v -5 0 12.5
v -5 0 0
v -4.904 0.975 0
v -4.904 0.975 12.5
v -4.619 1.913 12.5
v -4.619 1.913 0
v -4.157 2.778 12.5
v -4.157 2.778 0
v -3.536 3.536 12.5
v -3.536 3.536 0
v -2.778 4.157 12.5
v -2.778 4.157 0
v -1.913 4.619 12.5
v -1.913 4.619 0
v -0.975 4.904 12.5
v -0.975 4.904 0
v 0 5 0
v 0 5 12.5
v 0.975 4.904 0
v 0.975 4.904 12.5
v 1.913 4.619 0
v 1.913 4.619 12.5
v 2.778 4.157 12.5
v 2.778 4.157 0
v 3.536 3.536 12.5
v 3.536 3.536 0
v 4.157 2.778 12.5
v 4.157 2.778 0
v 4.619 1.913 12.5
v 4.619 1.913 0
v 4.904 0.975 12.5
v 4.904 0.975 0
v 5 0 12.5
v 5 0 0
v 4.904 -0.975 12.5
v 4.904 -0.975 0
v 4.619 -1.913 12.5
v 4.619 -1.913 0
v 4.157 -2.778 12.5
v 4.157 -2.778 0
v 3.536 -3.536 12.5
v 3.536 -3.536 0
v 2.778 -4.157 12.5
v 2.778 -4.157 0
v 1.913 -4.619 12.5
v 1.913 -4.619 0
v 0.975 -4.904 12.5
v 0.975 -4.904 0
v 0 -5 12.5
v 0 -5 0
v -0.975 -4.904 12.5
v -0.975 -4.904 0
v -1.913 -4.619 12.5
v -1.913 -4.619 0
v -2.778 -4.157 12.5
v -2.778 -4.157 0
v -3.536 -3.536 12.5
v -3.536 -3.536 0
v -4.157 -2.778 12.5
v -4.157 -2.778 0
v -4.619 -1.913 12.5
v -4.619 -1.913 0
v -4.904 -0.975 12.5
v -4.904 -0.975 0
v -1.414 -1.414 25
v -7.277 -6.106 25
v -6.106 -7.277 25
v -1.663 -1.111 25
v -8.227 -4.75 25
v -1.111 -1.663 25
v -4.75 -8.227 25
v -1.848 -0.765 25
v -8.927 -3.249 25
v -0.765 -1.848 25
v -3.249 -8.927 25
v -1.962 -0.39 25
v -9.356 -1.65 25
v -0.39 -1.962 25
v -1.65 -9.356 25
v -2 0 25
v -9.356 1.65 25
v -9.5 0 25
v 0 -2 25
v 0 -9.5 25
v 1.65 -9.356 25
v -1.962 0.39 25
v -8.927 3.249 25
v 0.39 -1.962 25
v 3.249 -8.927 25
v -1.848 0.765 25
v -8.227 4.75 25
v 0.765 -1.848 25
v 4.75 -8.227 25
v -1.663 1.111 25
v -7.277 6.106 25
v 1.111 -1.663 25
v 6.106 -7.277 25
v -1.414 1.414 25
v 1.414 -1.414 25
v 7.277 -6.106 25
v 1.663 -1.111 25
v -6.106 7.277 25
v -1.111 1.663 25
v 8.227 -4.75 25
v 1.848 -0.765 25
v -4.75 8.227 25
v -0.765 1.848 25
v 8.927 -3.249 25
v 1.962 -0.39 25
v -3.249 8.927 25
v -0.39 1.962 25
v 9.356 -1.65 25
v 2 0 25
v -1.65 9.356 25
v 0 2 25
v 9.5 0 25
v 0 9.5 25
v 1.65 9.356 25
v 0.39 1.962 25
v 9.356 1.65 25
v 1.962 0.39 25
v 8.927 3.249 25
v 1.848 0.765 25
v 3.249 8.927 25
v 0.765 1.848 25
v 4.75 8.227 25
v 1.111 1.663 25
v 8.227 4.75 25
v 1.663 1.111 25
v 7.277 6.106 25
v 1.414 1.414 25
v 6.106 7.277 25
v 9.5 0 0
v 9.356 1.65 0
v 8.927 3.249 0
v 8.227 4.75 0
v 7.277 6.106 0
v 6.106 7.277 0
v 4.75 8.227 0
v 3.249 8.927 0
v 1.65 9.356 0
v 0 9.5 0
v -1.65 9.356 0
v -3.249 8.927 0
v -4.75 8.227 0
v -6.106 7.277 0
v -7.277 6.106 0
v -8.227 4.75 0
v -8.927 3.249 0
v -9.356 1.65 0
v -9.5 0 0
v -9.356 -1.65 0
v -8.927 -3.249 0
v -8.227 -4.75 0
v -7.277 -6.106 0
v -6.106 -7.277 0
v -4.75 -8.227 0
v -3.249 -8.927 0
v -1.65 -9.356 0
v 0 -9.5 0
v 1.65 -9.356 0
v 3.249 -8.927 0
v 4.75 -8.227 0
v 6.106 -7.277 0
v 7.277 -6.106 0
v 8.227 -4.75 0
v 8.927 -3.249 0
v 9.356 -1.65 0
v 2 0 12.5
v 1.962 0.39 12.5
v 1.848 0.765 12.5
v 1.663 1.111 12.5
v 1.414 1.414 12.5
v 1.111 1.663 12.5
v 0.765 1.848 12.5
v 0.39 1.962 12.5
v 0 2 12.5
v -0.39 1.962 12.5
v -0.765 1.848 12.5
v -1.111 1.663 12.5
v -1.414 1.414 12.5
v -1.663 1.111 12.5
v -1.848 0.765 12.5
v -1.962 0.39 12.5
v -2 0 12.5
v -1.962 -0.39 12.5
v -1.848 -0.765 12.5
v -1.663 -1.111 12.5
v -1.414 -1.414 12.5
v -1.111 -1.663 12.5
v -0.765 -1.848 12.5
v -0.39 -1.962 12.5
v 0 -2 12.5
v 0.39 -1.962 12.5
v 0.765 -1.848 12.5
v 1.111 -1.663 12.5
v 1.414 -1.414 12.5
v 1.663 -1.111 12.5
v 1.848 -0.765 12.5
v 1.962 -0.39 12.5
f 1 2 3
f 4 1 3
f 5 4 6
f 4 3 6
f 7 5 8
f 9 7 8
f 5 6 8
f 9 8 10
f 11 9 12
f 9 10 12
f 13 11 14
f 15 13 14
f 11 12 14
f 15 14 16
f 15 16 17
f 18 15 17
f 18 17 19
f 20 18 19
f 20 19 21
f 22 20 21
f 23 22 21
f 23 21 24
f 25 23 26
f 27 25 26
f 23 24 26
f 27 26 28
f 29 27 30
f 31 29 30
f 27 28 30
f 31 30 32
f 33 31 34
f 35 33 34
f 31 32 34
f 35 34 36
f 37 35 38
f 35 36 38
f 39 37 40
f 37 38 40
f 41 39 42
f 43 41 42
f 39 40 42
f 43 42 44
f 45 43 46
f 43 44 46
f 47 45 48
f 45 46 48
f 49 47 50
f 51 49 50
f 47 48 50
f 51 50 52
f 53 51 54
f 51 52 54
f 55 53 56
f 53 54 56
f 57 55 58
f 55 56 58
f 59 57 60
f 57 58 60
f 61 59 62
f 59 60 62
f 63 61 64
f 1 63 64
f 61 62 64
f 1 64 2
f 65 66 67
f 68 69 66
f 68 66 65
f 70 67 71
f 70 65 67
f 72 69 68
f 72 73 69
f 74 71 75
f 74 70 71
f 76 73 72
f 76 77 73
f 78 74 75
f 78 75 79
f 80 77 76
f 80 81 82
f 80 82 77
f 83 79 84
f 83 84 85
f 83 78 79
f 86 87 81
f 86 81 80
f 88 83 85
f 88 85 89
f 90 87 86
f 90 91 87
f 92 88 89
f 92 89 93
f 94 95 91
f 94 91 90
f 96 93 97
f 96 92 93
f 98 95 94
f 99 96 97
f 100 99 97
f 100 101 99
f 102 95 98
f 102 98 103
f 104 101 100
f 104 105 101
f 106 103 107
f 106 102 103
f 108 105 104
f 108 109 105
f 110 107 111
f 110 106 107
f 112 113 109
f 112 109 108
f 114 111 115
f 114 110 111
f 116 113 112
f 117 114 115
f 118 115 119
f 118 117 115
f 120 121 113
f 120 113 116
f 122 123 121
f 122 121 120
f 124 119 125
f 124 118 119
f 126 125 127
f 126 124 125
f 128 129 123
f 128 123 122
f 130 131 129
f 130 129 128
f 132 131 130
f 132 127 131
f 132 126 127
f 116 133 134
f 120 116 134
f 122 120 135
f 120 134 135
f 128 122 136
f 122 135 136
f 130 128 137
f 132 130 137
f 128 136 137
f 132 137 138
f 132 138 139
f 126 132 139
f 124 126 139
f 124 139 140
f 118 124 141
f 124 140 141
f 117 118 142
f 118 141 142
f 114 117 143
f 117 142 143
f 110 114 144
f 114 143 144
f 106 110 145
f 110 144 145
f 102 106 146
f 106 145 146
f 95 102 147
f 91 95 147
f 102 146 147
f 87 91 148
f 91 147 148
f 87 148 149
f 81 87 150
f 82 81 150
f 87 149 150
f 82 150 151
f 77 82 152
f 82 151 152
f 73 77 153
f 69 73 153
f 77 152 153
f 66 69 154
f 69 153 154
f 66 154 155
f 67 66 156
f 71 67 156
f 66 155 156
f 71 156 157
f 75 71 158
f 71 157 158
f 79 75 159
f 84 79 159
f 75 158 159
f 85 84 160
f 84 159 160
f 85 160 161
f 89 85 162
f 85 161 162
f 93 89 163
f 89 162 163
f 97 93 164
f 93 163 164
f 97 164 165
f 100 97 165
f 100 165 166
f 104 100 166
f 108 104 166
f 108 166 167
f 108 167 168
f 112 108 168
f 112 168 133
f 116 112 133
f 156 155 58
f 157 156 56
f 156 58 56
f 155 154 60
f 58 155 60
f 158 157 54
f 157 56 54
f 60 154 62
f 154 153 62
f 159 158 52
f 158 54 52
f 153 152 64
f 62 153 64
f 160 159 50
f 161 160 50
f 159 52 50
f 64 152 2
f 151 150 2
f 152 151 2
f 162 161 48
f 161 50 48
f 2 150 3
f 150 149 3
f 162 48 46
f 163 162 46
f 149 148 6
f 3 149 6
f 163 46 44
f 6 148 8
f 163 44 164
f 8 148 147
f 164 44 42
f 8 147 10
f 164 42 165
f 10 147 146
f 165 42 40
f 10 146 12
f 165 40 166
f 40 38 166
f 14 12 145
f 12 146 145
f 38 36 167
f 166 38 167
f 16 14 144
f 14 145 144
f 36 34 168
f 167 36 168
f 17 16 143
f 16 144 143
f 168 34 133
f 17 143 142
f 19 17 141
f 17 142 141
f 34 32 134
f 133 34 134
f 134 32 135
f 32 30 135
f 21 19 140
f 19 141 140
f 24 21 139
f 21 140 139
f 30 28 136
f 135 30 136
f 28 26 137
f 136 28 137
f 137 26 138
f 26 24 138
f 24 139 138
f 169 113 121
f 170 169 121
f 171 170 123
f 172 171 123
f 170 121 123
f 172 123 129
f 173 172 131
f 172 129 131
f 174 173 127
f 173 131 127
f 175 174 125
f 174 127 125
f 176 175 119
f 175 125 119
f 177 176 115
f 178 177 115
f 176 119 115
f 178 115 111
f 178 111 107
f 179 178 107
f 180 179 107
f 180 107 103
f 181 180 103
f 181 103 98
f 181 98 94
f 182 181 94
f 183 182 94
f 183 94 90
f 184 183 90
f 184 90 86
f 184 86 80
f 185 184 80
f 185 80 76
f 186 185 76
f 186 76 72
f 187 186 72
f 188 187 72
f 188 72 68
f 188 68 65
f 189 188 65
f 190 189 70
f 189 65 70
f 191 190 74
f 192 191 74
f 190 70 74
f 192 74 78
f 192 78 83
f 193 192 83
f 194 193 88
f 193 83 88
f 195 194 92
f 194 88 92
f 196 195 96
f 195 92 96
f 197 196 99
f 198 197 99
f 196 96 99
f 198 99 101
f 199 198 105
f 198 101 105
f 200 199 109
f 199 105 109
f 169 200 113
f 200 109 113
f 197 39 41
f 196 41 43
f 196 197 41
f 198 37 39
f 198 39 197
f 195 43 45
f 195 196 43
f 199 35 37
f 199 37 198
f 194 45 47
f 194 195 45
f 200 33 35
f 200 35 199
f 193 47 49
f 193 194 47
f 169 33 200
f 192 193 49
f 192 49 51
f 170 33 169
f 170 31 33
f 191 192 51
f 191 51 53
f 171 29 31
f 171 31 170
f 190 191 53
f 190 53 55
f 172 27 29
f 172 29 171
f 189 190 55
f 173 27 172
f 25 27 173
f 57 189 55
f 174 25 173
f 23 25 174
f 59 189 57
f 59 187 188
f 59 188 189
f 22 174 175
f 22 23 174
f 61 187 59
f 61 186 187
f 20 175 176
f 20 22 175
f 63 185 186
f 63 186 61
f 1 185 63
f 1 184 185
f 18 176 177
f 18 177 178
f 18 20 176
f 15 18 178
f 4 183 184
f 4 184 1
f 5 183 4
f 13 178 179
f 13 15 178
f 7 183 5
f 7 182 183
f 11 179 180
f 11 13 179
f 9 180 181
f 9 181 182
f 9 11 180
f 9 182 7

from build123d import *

# Parameters (mm, degrees)
SKETCH1_R           = 9.5
BOSS_EXTRUDE1_DEPTH = 25
SKETCH2_R           = 2
CUT_EXTRUDE1_DEPTH  = 26
SKETCH3_R           = 5
CUT_EXTRUDE2_DEPTH  = 12.5


with BuildPart() as part:
    # Sketch1 → Boss-Extrude1 (new body)
    with BuildSketch(Plane.XY):
        Circle(SKETCH1_R)
    extrude(amount=BOSS_EXTRUDE1_DEPTH)

    # Sketch2 → Cut-Extrude1 (cut, through all)
    with BuildSketch(Plane.XY.offset(25)):
        Circle(SKETCH2_R)
    extrude(amount=-CUT_EXTRUDE1_DEPTH, mode=Mode.SUBTRACT)

    # Sketch3 → Cut-Extrude2 (cut)
    with BuildSketch(Plane(origin=(0, 0, 0), x_dir=(-1, 0, 0), z_dir=(0, 0, -1))):
        Circle(SKETCH3_R)
    extrude(amount=-CUT_EXTRUDE2_DEPTH, mode=Mode.SUBTRACT)


solid = part.part
